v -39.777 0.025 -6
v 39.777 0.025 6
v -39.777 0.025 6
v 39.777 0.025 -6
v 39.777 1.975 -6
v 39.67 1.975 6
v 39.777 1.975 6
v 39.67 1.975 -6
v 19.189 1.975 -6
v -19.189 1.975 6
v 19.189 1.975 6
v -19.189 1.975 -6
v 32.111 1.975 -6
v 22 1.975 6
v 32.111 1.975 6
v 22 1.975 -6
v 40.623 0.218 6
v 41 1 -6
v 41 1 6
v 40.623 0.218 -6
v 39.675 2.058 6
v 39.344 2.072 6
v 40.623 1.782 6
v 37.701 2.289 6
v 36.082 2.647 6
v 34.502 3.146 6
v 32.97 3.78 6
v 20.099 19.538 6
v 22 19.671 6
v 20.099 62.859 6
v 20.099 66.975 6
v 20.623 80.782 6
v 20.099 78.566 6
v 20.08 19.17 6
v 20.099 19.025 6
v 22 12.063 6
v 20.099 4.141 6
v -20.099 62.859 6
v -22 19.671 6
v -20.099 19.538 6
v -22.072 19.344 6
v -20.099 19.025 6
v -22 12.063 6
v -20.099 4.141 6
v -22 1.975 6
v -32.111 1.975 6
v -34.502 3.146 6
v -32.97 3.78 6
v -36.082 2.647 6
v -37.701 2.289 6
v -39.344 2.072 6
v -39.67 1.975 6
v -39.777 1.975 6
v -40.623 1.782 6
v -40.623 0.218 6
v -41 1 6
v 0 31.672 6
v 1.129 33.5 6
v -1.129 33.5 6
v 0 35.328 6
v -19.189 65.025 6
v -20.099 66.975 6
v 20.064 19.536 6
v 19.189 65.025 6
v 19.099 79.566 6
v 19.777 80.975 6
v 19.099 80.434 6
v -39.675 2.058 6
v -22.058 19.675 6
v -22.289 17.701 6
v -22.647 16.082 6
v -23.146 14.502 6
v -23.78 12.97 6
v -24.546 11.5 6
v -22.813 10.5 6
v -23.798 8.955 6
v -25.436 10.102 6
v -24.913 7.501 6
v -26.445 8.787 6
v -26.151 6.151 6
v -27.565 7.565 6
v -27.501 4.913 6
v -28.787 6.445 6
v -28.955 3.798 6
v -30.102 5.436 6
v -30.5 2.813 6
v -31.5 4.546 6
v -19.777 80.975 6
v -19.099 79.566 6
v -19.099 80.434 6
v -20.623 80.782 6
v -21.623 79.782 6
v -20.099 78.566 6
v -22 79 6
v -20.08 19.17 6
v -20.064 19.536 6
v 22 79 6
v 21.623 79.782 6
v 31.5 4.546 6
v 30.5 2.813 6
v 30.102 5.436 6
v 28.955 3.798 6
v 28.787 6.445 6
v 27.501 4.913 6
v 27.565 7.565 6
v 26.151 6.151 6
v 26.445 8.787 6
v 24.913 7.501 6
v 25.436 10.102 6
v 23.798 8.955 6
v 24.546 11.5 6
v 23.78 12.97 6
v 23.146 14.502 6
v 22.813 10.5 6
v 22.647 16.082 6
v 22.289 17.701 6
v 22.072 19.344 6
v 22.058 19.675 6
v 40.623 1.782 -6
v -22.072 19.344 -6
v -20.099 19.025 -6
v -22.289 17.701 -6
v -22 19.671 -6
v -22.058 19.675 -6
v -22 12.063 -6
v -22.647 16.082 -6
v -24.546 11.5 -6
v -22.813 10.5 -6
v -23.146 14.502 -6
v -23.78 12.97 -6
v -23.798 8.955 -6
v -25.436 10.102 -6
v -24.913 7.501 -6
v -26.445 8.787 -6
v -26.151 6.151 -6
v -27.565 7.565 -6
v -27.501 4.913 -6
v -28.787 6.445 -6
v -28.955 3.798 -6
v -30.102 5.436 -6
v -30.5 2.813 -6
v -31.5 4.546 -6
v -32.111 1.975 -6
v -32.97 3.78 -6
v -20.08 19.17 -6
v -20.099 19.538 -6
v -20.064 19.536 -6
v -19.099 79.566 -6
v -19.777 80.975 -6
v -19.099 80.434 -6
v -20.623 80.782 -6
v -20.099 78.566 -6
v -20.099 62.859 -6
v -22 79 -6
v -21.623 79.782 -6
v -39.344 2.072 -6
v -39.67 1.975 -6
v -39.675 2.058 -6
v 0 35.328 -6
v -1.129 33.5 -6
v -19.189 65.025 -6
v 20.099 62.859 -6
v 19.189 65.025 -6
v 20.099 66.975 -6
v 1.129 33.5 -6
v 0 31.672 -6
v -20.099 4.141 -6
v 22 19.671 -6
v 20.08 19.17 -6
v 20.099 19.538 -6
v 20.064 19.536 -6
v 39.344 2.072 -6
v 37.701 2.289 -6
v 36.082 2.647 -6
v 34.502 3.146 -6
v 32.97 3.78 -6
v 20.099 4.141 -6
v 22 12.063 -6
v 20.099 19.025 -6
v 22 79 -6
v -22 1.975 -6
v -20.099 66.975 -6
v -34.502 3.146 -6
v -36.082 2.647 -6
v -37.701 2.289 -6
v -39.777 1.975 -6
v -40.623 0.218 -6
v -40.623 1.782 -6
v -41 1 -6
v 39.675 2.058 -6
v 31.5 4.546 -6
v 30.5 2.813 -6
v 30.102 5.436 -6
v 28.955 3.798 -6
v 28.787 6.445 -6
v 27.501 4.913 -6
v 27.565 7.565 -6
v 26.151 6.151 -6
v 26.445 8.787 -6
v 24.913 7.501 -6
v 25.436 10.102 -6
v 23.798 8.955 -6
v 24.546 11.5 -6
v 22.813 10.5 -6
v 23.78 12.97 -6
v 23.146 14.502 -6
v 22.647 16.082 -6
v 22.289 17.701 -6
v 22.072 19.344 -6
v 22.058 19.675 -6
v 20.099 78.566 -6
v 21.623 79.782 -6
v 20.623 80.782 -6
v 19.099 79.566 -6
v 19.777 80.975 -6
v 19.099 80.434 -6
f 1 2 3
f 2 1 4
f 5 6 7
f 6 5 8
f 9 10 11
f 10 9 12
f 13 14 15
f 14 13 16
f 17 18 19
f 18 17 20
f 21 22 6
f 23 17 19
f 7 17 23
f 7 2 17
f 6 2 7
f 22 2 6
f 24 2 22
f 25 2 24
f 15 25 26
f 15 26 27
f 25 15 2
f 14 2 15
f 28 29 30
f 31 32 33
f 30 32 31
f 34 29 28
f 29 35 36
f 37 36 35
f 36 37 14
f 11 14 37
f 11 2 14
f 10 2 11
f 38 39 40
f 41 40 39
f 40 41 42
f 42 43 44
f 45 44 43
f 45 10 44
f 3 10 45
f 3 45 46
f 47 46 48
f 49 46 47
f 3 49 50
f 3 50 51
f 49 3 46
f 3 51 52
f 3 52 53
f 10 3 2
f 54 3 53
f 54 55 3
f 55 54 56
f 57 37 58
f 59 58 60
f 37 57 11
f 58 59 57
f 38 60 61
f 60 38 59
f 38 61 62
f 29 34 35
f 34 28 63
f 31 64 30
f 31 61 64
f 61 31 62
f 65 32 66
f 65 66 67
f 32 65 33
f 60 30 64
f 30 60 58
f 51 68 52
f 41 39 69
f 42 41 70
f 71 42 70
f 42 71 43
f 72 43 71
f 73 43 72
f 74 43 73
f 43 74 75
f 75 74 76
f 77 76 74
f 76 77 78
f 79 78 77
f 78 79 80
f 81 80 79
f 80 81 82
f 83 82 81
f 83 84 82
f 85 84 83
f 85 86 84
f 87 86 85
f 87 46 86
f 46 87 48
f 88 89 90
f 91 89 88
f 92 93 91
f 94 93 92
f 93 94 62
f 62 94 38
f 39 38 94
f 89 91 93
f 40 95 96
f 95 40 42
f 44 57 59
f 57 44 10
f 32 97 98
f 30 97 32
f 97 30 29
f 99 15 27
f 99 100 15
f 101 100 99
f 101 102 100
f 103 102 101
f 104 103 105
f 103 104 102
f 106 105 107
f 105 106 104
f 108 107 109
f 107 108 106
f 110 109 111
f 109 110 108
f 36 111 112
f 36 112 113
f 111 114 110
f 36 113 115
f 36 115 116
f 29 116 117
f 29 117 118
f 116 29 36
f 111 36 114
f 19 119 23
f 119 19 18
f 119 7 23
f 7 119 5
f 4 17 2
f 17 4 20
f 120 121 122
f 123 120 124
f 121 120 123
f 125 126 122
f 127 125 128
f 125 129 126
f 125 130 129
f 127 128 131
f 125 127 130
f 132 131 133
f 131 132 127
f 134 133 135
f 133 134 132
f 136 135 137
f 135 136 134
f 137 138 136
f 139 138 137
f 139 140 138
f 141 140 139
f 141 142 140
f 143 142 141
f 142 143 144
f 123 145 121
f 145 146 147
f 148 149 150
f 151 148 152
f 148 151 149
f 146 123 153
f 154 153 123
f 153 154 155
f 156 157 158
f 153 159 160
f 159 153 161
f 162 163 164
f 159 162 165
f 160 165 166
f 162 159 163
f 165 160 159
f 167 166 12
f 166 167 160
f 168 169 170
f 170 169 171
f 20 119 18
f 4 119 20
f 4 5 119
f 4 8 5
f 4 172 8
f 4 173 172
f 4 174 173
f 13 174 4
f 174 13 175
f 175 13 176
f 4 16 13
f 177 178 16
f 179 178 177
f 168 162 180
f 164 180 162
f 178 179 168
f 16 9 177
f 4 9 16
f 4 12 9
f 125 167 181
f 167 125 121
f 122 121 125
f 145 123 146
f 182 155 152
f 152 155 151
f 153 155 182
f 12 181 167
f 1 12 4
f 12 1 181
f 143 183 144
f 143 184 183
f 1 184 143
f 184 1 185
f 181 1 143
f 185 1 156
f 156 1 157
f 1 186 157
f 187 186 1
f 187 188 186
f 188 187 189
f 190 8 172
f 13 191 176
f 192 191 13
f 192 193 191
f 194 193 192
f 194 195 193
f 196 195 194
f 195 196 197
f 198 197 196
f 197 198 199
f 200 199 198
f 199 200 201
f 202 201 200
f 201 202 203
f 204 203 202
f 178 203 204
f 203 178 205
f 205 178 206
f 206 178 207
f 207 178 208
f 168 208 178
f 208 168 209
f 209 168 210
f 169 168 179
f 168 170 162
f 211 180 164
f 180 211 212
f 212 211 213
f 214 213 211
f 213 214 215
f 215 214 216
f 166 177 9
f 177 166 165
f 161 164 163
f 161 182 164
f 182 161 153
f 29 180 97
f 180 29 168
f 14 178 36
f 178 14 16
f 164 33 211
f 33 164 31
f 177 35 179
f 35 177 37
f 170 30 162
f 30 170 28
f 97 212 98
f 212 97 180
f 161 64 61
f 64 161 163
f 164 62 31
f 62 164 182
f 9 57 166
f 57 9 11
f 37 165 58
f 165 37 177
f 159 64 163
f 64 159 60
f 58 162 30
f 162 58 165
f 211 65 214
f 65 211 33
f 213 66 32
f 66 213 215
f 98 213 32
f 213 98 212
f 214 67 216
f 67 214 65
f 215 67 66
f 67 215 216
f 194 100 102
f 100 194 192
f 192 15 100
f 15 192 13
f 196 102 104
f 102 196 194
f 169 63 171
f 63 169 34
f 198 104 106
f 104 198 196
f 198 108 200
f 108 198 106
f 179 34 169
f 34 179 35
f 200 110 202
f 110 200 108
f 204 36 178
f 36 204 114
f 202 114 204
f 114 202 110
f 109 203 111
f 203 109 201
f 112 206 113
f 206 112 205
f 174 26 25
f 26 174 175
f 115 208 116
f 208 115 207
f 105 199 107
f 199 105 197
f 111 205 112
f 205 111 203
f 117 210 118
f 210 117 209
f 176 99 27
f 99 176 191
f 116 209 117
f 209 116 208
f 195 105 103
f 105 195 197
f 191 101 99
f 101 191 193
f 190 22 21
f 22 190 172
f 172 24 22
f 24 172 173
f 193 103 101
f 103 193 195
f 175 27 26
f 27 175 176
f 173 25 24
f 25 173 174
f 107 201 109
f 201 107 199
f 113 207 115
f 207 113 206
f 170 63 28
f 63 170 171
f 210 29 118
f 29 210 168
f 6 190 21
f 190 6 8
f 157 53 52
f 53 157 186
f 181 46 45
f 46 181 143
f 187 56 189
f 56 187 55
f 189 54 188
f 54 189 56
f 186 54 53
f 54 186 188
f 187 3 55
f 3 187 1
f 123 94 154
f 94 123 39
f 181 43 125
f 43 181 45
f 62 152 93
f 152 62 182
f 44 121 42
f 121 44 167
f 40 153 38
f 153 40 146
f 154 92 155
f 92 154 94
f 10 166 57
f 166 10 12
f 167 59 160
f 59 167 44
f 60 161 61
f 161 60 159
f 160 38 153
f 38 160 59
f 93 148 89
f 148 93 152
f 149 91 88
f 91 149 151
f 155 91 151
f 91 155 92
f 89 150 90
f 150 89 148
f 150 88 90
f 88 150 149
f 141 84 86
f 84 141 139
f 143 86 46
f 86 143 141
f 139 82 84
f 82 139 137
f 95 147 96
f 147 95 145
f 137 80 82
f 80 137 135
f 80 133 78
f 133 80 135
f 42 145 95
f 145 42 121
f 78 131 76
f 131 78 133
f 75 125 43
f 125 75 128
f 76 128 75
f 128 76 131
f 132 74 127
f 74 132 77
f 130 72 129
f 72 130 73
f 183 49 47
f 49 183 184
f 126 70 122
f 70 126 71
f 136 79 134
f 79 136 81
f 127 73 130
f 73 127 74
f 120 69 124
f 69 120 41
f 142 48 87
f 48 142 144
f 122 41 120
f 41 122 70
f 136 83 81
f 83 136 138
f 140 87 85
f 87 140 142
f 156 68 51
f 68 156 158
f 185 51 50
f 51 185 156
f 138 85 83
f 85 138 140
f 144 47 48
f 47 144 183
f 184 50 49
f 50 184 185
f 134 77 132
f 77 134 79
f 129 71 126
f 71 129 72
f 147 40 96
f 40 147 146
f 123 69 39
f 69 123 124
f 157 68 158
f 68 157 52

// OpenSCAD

width = 40;
height = 67;
track_height = 12;
support_width = 20;
thickness = 2;

$fa = 5;
$fs = 1;

extra_width = (support_width <= height) ? support_width : height;

points = [
    [-thickness,thickness/2],
    [width/2+thickness/2,thickness/2],
    [width/2+thickness/2,height-thickness/2],
    [-thickness,height-thickness/2],
    [0,height/2],
    [width/2+extra_width,thickness/2],
    [width/2+thickness/2,height+track_height],
    [width/2,height+track_height+thickness/2]
];

links = [[0,5],[1,6],[2,3],[1,4],[2,4],[6,7]];

mirX() union() {
    mesh(points, links, d=thickness, h=track_height);
    translate([width/2+extra_width+thickness/2,extra_width+thickness/2,0])
        rotate(-45)
            arc(h=track_height,d=extra_width*2+thickness,d2=extra_width*2-thickness, a=82);
}




module arc(h, d, t, a=360, d1=false, d2=false) {
	outerD = (d1==false) ? d : d1;
	innerD = (d2==false) ? d-t*2 : d2;
	2dia = 2*d;
	difference() {
	 	difference() {
			cylinder(h=h, d=d, center=true);
			cylinder(h=h+1, d=innerD, center=true);
		}
		//triangle
		if(a<360) {
			linear_extrude(height = h+1, center = true, convexity=10)
				polygon(points=[[0,0],[2dia*sin(a/2),-2dia*cos(a/2)],[2dia,-2dia],[2dia,2dia],[-2dia,2dia],[-2dia,-2dia],[-2dia*sin(a/2),-2dia*cos(a/2)]]);
		}
	}
}

module mesh(p, x="All", d=5, h=5, shape="cylinder", cenTrue=true) {
	//echo(len(d));
	d= (len(d)>1) ? d : [d,d,d,d,d,d,d,d,d,d,d,d,d,d,d,d,d,d,d,d,d,d,d,d,d,d,d];
	//x = (x=='Chain') ? [ for (i = [0:len(p)]) [i,i+1] ] : x;
	all= (x=="All") ? true : false;
	if (all==false) {
		for(i = x) {
			hull() {
				//echo(d[i[0]], d[i[1]]);
				translate(p[i[0]]) part(shape, d=d[i[0]], h=h, center=cenTrue);
				translate(p[i[1]]) part(shape, d=d[i[1]], h=h, center=cenTrue);
			}
		}
	} else {
		for(i = [0:len(p)-1]) {
			for(j = [i:len(p)-1]) {
				hull() {
					echo(i, j, p[i], p[j]);
					translate(p[i]) part(shape, d=d[i], h=h, center=cenTrue);
					translate(p[j]) part(shape, d=d[j], h=h, center=cenTrue);
				}
			}
		}
	}
	module part(type, d, h=0, cenTrue=true) {
		if(type=="cube") {
			cube([d,d,h], center=cenTrue);
		}
		if(type=="sphere") {
			sphere(d=d, center=cenTrue);
		}
		if(type=="cylinder") {
			cylinder(d=d, h=h, center=cenTrue);
		}
	}
}

module mir(plane=[1,0,0]) {
	children();
	mirror(plane)
		children();
}
module mirX() {children(); mirror([1,0,0]) children();}
module mirY() {children(); mirror([0,1,0]) children();}
module mirZ() {children(); mirror([0,0,1]) children();}
